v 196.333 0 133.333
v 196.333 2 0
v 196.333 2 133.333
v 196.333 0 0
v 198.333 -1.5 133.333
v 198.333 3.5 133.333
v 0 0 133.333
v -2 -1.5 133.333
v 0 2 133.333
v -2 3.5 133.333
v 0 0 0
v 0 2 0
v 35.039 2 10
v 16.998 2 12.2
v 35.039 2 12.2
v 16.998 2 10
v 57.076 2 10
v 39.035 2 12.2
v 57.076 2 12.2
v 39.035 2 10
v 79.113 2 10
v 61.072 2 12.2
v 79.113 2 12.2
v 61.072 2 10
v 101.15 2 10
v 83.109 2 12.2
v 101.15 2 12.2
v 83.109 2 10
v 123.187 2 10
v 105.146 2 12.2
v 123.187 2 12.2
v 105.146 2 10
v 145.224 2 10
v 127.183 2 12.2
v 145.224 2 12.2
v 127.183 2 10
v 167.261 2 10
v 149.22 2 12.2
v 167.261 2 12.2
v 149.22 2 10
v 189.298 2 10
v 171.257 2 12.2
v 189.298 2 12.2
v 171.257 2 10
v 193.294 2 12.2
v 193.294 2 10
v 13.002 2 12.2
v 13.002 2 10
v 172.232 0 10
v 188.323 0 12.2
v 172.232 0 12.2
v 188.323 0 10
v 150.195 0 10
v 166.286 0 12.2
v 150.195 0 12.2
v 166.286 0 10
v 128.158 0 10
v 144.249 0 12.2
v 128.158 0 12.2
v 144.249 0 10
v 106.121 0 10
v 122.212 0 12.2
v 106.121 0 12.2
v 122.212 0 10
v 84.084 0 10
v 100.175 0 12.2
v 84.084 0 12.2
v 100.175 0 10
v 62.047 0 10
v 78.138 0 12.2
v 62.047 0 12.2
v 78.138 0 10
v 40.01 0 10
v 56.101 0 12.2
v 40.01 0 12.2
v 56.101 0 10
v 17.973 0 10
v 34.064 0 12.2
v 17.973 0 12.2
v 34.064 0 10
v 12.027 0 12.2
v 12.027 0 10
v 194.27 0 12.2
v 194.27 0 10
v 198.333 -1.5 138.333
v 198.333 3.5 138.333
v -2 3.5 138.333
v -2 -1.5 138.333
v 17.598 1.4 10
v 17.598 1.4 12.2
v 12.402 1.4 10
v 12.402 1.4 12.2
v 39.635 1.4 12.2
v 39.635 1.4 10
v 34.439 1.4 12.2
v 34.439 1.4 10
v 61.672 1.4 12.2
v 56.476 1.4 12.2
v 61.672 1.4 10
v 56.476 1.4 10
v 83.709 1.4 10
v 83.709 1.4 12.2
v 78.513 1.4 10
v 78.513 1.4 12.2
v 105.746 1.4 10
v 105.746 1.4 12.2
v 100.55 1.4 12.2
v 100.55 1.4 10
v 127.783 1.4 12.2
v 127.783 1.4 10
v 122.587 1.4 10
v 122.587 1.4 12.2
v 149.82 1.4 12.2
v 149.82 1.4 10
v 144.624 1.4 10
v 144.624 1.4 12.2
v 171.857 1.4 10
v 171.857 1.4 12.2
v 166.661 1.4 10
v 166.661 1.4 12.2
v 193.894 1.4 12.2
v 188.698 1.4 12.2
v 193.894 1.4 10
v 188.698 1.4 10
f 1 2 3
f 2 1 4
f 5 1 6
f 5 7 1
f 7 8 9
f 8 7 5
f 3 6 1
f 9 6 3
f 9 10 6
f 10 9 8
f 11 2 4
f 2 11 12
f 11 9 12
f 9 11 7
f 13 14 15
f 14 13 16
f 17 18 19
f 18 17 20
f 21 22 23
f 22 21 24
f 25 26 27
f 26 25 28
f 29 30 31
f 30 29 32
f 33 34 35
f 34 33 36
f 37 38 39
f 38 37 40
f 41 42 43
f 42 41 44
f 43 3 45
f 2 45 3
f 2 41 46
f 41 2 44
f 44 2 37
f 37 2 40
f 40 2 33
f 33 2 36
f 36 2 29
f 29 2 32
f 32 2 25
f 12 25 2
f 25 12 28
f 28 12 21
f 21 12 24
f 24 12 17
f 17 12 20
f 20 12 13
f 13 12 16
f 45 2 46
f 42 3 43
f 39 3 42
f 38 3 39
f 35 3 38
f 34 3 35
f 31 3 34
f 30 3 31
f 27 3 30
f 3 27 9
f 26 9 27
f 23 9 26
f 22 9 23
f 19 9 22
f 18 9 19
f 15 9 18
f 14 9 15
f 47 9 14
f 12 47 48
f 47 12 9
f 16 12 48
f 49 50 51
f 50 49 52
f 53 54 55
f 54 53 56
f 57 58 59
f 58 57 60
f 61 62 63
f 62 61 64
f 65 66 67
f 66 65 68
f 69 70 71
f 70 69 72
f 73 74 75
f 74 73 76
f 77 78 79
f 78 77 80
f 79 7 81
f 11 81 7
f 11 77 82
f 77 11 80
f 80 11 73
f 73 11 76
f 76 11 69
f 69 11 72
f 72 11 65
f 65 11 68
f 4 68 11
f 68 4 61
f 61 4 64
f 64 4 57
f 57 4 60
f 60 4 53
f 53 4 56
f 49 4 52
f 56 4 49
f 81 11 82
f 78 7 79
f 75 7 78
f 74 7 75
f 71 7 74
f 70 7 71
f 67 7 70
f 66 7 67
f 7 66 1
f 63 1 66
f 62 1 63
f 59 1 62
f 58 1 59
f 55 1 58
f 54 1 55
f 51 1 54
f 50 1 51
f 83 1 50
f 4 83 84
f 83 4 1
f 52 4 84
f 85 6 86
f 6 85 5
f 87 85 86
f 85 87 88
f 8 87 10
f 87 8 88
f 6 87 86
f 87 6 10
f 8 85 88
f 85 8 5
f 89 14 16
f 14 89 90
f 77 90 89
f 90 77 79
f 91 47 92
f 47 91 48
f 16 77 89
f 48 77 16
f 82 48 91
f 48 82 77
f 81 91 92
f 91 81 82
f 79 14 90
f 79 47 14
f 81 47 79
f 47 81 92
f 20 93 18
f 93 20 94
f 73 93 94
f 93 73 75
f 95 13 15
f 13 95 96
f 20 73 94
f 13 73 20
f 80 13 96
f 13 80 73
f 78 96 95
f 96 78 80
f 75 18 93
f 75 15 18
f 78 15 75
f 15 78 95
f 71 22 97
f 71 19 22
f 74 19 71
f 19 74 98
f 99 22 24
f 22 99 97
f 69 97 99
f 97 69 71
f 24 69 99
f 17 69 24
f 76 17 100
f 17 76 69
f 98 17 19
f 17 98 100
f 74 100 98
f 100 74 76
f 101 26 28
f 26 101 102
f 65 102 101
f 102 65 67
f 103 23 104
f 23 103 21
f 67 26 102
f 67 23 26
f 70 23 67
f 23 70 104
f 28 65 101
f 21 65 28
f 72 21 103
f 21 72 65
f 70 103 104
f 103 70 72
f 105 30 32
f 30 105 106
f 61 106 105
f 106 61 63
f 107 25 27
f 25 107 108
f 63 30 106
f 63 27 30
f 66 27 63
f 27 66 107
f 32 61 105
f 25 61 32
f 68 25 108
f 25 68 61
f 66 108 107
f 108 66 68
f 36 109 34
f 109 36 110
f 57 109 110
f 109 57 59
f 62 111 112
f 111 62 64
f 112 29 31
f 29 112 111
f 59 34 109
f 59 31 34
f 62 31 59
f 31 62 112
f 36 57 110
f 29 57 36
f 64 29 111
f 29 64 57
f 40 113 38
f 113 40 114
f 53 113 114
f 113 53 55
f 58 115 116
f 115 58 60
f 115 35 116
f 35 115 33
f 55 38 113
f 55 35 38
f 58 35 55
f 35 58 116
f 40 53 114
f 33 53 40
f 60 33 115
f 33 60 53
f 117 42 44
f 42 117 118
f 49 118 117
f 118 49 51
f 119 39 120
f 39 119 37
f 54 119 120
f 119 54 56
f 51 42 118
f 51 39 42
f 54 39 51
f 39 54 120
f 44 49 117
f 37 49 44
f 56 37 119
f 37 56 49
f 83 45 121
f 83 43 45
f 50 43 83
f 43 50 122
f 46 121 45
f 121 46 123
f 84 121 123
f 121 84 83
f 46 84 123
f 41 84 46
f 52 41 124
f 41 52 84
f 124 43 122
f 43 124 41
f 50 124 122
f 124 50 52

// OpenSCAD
// file: goodsort-bin-prototype.scad
// ══════════════════════════════════════════════════════════════
// The Good Sort — 1:3 Scale 240L Yellow Bin + Sliding Divider
// ══════════════════════════════════════════════════════════════
// Print at 1:3 scale on Snapmaker U1 (270×270×270mm bed)
// All dimensions in mm (real-world in comments, model = real/3)
//
// Components (print separately):
//   1. bin_shell()        — the yellow bin body
//   2. rail_pair_width()  — 2 rail tracks for the width-axis divider
//   3. rail_pair_depth()  — 2 rail tracks for the depth-axis divider
//   4. divider_width()    — sliding wall (width direction)
//   5. divider_depth()    — sliding wall (depth direction)
//   6. centre_post()      — locking intersection post
//
// To render one part: uncomment it at the bottom of the file

// ── Parameters (real-world mm, divided by scale) ──────────────
scale       = 1/3;

// SULO 240L internal dimensions (real)
real_width  = 560;    // side to side
real_depth  = 640;    // front to back
real_height = 580;    // internal depth
real_taper  = 30;     // each side narrows by this at the bottom

// Model dimensions
w  = real_width  * scale;  // ~187mm
d  = real_depth  * scale;  // ~213mm
h  = real_height * scale;  // ~193mm
tp = real_taper  * scale;  // ~10mm taper per side

// Wall thicknesses
bin_wall    = 2.5;    // bin shell wall
div_thick   = 2.0;    // divider wall thickness
rail_h      = 4.0;    // rail track height
rail_slot   = 2.4;    // slot width in rail (divider slides through)
notch_space = 50 * scale; // ~17mm between notch detents
notch_depth = 0.6;    // how deep the click notch is
notch_width = 2.0;    // notch width along rail

// Divider height (shorter than bin so items can slide out when tipped)
div_height  = 400 * scale; // ~133mm (leaves ~60mm clearance at bottom)

// Centre post
post_size   = 8;      // square cross-section of centre locking post


// ── Modules ───────────────────────────────────────────────────

// Tapered bin shell (open top, no bottom for easy printing)
module bin_shell() {
    difference() {
        // Outer shell — tapered box
        hull() {
            // Top (wider)
            translate([0, 0, h])
                cube([w + bin_wall*2, d + bin_wall*2, 0.01], center=true);
            // Bottom (narrower due to taper)
            translate([0, 0, 0])
                cube([w + bin_wall*2 - tp*2, d + bin_wall*2 - tp*2, 0.01], center=true);
        }
        // Inner cavity
        hull() {
            translate([0, 0, h + 0.1])
                cube([w, d, 0.01], center=true);
            translate([0, 0, bin_wall])
                cube([w - tp*2, d - tp*2, 0.01], center=true);
        }
    }
}

// Rail track — clips to inner bin wall, has a slot for the divider to slide through
module rail_track(length, with_notches=true) {
    difference() {
        // Rail body
        cube([length, rail_h, rail_h]);
        // Slot for divider
        translate([-0.1, (rail_h - rail_slot)/2, rail_h * 0.3])
            cube([length + 0.2, rail_slot, rail_h]);
    }
    // Notch detents inside the slot
    if (with_notches) {
        for (i = [1 : floor(length / notch_space) - 1]) {
            translate([i * notch_space - notch_width/2, (rail_h - rail_slot)/2 - notch_depth, rail_h * 0.3])
                cube([notch_width, notch_depth + 0.1, rail_h * 0.5]);
            translate([i * notch_space - notch_width/2, (rail_h + rail_slot)/2, rail_h * 0.3])
                cube([notch_width, notch_depth + 0.1, rail_h * 0.5]);
        }
    }
}

// Rail pair for width-axis divider (these mount on front + back inner walls)
module rail_pair_width() {
    // Front rail
    rail_track(w - tp*1.5);
    // Back rail (offset for visual clarity when printing)
    translate([0, rail_h + 5, 0])
        rail_track(w - tp*1.5);
}

// Rail pair for depth-axis divider (mount on left + right inner walls)
module rail_pair_depth() {
    rail_track(d - tp*1.5);
    translate([0, rail_h + 5, 0])
        rail_track(d - tp*1.5);
}

// Sliding divider wall (width direction — slides left/right)
module divider_width() {
    // Main wall panel
    cube([d - tp*1.5 - 2, div_thick, div_height]);

    // Top grip/label strip (wider for grabbing + label area)
    translate([-2, -1.5, div_height])
        cube([d - tp*1.5 + 2, div_thick + 3, 5]);

    // Centre slot (cut from top, half height) for interlocking with depth divider
    // This will be done as a difference in the assembly
}

// Sliding divider wall (depth direction — slides front/back)
module divider_depth() {
    cube([w - tp*1.5 - 2, div_thick, div_height]);

    // Top grip/label strip
    translate([-2, -1.5, div_height])
        cube([w - tp*1.5 + 2, div_thick + 3, 5]);
}

// Centre post — locks the two dividers at their intersection
module centre_post() {
    difference() {
        cube([post_size, post_size, div_height * 0.8]);
        // Cross slots for the two divider walls
        translate([-0.1, (post_size - div_thick)/2 - 0.1, -0.1])
            cube([post_size + 0.2, div_thick + 0.2, div_height + 0.2]);
        translate([(post_size - div_thick)/2 - 0.1, -0.1, -0.1])
            cube([div_thick + 0.2, post_size + 0.2, div_height + 0.2]);
    }
}

// ── Drain holes for divider walls ─────────────────────────────
module divider_width_with_drains() {
    difference() {
        divider_width();
        // Drain holes along bottom edge
        for (i = [0 : 8]) {
            translate([15 + i * ((d - tp*1.5) / 9), -0.1, 10])
                cylinder(h = div_thick + 0.2, r = 3, $fn=12);
        }
    }
}

module divider_depth_with_drains() {
    difference() {
        divider_depth();
        for (i = [0 : 6]) {
            translate([15 + i * ((w - tp*1.5) / 7), -0.1, 10])
                cylinder(h = div_thick + 0.2, r = 3, $fn=12);
        }
    }
}


// ── Assembly view (for visualisation, don't print this) ───────
module assembly() {
    color("Gold", 0.3) bin_shell();

    // Width divider (slides left-right) — positioned at centre
    color("Green", 0.8)
        translate([0, -div_thick/2, bin_wall + (h - div_height)/2])
            translate([-((d - tp*1.5 - 2)/2), 0, 0])
                divider_width_with_drains();

    // Depth divider (slides front-back) — positioned at centre
    color("DarkGreen", 0.8)
        translate([-div_thick/2, 0, bin_wall + (h - div_height)/2])
            translate([0, -((w - tp*1.5 - 2)/2), 0])
                rotate([0, 0, 90])
                    divider_depth_with_drains();

    // Centre post
    color("Black")
        translate([-post_size/2, -post_size/2, bin_wall])
            centre_post();

    // Rails (width axis — on front and back walls)
    color("Gray")
        translate([-(w - tp*1.5)/2, d/2 - rail_h, bin_wall + 5])
            rail_track(w - tp*1.5);
    color("Gray")
        translate([-(w - tp*1.5)/2, -d/2, bin_wall + 5])
            rail_track(w - tp*1.5);

    // Rails (depth axis — on left and right walls)
    color("DarkGray")
        translate([w/2 - rail_h, -(d - tp*1.5)/2, bin_wall + 5])
            rotate([0, 0, 90])
                rail_track(d - tp*1.5);
    color("DarkGray")
        translate([-w/2, -(d - tp*1.5)/2, bin_wall + 5])
            rotate([0, 0, 90])
                rail_track(d - tp*1.5);
}


// ══════════════════════════════════════════════════════════════
// UNCOMMENT ONE AT A TIME TO RENDER + EXPORT AS STL:
// ══════════════════════════════════════════════════════════════

// Show full assembly (for preview only — don't print this)
// assembly();

// Individual parts for printing:
// bin_shell();
// rail_pair_width();
// rail_pair_depth();
// divider_width_with_drains();
// divider_depth_with_drains();
// centre_post();
// main file
include <goodsort-bin-prototype.scad>;
divider_width_with_drains();
